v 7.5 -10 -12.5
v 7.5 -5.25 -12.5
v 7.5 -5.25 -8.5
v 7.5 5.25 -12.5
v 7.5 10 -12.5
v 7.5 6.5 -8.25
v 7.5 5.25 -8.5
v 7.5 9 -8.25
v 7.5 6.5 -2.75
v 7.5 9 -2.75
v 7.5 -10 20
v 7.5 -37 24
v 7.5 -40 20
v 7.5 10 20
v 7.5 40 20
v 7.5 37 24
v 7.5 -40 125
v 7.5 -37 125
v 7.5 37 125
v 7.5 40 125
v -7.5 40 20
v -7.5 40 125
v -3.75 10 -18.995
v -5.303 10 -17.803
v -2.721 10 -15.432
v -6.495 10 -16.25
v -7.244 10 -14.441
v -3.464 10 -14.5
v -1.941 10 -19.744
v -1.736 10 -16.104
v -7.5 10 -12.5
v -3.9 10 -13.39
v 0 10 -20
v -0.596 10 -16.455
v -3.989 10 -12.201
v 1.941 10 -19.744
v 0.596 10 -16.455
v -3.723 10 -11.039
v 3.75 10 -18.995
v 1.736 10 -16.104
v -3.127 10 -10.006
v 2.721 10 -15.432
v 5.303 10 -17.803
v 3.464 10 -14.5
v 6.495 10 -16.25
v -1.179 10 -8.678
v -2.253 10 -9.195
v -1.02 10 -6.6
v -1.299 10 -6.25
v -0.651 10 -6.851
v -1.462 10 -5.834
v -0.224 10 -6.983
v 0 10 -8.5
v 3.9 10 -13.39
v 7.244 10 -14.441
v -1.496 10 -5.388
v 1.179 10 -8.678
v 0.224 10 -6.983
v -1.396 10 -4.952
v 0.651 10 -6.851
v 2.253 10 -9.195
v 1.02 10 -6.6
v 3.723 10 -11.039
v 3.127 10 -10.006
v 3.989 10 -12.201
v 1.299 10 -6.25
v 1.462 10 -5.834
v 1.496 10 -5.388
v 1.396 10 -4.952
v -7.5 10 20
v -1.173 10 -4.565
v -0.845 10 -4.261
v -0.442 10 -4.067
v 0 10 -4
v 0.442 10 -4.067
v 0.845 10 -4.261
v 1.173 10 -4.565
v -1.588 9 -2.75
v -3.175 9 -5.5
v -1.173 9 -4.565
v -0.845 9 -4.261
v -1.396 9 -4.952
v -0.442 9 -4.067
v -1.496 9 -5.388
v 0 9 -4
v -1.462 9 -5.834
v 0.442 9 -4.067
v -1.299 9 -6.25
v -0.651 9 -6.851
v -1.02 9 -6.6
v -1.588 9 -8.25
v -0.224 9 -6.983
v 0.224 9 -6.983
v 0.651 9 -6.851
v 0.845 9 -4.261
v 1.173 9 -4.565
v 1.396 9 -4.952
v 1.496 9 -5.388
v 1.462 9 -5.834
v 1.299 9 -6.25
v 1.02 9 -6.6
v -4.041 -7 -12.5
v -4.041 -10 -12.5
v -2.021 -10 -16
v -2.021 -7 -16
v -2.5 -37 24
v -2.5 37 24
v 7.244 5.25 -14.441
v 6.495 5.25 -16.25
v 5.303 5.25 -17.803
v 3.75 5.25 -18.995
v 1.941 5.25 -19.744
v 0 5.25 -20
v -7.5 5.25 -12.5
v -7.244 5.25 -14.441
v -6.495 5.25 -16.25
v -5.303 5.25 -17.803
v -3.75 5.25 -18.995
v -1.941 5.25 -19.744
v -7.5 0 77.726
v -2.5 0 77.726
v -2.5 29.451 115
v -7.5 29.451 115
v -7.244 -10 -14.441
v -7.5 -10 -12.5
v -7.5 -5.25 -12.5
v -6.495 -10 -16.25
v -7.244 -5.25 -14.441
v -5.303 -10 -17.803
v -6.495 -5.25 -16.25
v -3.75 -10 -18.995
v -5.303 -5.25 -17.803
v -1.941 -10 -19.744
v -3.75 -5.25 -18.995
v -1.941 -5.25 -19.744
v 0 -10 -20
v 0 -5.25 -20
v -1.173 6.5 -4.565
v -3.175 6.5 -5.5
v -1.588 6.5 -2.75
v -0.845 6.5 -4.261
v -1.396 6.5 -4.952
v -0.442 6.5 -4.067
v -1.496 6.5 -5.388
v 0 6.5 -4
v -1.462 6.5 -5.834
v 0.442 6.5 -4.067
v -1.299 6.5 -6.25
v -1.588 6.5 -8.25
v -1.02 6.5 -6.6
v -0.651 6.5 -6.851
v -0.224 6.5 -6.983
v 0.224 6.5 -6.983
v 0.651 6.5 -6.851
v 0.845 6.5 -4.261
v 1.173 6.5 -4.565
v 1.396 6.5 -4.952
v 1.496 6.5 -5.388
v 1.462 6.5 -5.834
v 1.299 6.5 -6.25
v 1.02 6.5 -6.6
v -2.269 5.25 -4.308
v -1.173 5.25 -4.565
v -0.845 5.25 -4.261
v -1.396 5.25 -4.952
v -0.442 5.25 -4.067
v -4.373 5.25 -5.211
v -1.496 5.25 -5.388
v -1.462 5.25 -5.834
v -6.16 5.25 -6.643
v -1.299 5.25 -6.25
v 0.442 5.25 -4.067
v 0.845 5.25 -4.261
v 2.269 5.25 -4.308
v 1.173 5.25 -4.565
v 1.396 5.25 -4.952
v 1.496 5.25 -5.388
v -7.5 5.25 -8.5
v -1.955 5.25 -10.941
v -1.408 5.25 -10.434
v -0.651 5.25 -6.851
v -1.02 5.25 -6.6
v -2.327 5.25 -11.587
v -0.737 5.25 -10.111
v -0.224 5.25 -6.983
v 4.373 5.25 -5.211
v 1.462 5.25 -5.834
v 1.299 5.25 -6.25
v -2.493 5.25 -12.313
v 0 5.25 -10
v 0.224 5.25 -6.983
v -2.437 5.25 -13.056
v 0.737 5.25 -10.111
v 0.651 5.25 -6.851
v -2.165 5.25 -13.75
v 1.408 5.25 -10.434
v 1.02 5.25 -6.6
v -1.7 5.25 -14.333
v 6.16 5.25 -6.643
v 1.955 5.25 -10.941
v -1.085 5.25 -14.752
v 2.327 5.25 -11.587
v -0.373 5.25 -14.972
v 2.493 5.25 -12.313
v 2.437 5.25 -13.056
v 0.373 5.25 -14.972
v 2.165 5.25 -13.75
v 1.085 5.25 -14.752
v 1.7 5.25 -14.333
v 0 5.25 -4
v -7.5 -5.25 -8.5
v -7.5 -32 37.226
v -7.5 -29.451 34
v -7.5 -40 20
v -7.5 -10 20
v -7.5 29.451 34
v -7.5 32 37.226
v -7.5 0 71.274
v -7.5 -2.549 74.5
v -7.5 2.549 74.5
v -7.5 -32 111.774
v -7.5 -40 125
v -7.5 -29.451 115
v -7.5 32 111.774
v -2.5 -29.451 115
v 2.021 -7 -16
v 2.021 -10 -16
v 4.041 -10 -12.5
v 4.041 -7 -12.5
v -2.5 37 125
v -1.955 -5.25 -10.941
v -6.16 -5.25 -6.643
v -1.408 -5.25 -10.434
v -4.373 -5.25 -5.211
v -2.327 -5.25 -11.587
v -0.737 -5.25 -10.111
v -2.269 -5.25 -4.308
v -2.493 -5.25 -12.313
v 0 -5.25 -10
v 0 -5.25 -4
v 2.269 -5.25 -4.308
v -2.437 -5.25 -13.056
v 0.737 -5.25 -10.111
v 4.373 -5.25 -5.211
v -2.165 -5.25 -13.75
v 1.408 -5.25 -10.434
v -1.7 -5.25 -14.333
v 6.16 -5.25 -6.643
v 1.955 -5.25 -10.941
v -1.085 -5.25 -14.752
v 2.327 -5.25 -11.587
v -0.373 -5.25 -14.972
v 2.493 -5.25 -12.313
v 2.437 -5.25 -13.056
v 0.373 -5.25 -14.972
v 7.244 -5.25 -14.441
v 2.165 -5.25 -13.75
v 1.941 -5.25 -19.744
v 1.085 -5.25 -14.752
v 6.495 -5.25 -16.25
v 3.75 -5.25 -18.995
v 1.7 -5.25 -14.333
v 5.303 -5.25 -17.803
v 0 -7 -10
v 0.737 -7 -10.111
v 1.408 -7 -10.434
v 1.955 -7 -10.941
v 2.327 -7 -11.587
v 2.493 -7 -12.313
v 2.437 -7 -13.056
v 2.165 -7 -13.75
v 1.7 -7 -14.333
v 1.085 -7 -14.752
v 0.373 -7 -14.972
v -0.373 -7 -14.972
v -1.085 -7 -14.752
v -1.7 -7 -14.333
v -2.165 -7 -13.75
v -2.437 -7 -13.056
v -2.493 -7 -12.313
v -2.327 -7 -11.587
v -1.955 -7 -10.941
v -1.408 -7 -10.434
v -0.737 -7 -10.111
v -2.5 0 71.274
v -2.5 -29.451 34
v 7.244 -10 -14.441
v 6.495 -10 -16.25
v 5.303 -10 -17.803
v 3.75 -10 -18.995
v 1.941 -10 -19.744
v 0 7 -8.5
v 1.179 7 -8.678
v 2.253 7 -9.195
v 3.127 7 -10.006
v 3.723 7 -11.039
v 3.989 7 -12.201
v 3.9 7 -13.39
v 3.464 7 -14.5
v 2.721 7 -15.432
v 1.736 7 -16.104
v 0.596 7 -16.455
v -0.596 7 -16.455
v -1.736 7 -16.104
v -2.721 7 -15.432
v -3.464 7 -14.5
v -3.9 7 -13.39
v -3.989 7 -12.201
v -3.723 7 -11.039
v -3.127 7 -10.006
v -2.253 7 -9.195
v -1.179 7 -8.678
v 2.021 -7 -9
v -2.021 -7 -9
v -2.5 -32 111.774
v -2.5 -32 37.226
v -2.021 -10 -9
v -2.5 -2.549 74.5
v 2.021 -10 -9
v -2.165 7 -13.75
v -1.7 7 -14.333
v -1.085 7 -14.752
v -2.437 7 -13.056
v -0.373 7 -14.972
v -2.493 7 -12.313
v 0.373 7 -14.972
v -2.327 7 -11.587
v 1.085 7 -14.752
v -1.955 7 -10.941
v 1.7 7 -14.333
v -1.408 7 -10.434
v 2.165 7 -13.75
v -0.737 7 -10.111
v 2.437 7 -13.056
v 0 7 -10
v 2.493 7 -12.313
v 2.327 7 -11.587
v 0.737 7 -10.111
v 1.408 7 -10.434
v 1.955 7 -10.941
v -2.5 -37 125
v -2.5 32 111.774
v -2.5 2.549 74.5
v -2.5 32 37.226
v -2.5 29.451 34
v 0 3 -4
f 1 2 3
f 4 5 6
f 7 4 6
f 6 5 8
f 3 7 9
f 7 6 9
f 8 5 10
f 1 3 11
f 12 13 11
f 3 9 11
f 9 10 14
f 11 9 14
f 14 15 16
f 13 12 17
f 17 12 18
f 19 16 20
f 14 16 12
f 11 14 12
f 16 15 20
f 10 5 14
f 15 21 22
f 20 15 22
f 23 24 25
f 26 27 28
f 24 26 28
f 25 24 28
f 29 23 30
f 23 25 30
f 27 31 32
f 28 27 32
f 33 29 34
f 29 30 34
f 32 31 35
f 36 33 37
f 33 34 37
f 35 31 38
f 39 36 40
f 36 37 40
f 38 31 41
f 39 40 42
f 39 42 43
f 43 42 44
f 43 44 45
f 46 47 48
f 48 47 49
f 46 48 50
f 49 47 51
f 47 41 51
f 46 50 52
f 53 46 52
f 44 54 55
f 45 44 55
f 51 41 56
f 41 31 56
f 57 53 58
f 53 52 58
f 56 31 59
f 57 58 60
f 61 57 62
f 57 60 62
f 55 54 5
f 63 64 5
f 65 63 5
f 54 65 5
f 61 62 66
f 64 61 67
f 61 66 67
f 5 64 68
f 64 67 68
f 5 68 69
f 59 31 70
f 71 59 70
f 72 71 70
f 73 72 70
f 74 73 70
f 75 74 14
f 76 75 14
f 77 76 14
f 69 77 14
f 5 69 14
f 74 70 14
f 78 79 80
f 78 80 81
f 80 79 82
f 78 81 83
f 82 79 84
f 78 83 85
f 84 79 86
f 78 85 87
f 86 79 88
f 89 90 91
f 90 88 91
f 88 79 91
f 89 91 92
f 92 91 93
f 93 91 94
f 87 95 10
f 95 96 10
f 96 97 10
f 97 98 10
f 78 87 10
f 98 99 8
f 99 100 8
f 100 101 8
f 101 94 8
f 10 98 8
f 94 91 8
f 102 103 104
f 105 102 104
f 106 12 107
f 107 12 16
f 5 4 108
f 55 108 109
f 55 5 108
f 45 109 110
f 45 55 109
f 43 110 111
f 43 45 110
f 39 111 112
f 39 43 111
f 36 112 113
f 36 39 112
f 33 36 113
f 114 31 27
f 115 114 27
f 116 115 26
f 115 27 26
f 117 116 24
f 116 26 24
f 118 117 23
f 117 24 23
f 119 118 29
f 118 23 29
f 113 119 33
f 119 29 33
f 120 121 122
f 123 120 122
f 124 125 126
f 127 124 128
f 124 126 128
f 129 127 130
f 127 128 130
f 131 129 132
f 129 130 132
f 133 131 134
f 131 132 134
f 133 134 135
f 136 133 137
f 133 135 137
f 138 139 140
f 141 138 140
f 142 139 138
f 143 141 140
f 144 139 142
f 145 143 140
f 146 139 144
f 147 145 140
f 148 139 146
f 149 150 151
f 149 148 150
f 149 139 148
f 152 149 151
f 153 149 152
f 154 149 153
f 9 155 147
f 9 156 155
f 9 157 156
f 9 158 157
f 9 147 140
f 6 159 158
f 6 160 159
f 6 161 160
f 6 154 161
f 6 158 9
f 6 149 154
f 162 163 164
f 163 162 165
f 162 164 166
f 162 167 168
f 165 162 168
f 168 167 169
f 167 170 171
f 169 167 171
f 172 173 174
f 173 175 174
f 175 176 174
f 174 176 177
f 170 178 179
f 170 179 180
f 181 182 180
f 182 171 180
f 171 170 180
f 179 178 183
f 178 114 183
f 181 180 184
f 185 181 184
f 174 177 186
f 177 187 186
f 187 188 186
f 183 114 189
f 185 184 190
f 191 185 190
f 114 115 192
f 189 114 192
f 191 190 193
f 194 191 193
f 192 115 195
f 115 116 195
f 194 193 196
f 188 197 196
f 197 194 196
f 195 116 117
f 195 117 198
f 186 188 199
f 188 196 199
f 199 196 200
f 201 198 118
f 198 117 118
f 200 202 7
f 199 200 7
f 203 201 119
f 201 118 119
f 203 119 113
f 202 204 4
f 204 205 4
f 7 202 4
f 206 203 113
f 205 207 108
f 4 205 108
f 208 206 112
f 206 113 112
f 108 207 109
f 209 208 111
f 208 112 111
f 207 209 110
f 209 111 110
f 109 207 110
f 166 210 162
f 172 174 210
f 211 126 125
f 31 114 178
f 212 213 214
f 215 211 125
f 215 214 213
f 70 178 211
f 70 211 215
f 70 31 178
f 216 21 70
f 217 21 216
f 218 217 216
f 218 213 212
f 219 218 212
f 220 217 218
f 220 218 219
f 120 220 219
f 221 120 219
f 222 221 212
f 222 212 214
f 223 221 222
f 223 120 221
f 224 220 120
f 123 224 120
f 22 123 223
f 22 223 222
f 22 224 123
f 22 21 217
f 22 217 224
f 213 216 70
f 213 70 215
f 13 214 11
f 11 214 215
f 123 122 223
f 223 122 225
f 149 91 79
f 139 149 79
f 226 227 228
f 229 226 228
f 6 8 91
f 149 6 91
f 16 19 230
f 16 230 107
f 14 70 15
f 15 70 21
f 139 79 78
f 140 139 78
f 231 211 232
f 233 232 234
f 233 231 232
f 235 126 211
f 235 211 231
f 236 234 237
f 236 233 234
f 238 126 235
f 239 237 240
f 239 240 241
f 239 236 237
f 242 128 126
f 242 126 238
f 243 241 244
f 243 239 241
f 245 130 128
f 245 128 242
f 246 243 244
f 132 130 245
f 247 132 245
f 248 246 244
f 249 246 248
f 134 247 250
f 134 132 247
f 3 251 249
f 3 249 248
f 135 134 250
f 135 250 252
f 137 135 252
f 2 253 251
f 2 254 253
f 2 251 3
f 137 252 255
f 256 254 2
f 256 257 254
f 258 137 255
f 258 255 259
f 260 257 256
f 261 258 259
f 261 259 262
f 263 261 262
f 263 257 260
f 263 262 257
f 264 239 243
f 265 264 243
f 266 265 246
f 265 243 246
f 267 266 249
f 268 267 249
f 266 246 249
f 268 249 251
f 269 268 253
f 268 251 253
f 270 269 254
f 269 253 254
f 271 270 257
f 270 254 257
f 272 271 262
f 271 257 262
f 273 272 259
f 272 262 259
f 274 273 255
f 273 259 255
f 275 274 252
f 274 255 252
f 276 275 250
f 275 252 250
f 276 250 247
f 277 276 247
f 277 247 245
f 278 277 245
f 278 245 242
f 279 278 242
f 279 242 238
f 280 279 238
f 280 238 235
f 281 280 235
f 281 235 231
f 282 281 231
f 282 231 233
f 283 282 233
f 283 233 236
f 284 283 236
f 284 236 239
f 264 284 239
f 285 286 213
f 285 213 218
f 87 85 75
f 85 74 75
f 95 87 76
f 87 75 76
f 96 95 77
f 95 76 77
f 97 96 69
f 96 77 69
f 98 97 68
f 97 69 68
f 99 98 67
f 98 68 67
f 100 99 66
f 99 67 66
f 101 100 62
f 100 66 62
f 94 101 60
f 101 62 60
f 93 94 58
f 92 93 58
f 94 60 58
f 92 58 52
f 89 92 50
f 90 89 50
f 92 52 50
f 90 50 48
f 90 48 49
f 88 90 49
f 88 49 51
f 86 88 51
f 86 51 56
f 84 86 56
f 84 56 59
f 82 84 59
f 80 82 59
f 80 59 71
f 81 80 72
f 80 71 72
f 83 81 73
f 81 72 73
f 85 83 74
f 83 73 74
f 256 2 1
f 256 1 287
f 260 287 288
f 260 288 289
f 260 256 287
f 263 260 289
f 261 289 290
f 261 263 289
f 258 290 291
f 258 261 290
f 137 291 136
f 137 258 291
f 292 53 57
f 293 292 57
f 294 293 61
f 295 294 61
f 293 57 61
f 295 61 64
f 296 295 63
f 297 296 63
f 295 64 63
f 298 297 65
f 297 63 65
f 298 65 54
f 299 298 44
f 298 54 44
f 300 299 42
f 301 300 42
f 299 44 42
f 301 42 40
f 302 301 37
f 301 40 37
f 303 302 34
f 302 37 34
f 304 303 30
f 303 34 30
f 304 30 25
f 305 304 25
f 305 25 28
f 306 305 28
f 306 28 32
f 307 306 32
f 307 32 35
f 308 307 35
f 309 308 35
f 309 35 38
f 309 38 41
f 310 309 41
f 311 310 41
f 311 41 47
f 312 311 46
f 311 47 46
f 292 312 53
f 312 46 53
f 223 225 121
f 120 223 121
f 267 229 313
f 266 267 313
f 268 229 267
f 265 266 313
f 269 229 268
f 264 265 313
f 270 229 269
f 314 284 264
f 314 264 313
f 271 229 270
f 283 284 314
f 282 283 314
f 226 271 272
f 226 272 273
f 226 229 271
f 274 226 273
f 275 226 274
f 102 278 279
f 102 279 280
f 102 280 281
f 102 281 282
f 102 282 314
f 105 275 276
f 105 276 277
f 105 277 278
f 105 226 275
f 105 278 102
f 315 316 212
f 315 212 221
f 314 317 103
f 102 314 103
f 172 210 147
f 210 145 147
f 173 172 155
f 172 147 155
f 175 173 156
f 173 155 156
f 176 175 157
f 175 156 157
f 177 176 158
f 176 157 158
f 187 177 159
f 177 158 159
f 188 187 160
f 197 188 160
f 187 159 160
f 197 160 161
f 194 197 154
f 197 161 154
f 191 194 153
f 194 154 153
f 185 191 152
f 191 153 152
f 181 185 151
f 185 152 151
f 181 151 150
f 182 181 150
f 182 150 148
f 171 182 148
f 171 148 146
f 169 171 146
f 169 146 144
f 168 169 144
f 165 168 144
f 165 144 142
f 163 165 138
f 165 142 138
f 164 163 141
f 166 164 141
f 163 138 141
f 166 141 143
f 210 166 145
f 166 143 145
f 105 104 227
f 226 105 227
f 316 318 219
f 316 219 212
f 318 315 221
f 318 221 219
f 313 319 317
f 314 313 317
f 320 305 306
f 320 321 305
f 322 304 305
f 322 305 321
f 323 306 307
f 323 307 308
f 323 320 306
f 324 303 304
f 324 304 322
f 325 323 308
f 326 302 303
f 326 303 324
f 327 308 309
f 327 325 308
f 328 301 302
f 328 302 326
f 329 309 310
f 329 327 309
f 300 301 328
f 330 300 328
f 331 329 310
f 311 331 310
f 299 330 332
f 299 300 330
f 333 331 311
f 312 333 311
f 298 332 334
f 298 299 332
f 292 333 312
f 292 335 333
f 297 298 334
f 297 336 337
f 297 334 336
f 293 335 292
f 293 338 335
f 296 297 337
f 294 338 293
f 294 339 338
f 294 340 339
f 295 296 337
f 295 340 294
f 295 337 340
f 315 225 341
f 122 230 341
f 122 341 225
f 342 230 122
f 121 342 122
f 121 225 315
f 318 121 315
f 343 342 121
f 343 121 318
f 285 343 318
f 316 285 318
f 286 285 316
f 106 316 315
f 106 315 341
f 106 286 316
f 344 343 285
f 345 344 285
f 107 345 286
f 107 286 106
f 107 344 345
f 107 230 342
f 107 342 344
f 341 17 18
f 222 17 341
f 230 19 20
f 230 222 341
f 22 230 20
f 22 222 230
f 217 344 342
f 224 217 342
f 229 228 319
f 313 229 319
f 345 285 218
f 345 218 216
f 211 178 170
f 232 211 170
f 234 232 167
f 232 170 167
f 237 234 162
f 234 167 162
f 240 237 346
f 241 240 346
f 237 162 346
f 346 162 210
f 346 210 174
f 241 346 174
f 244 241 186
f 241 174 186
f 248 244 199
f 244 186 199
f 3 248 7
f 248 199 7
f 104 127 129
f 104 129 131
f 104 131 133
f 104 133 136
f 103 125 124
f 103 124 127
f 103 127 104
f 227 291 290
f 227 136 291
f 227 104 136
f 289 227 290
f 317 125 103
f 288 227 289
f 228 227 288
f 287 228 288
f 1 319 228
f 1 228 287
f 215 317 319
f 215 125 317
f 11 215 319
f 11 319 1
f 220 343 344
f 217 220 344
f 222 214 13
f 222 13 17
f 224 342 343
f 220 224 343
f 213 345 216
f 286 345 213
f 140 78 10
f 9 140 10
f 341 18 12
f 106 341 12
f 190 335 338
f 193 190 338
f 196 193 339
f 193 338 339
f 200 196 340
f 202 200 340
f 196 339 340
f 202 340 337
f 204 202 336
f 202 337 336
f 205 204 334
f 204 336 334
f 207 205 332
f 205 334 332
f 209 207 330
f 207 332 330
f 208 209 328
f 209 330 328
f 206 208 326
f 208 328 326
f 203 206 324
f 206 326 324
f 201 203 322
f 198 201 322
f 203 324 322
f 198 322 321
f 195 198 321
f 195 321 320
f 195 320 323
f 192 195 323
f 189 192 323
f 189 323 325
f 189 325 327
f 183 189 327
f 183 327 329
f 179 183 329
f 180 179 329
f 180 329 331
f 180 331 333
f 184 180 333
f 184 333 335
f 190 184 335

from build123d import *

# Parameters (mm, degrees)
SKETCH1_W           = 15
SKETCH1_H           = 20
BOSS_EXTRUDE1_DEPTH = 20
FILLET1_R           = 7.5
CUT_EXTRUDE1_START  = -4.75
SKETCH3_R           = 8.5
CUT_EXTRUDE1_DEPTH  = 10.5
SKETCH4_R           = 2.5
CUT_EXTRUDE2_DEPTH  = 30.261749777
CUT_EXTRUDE3_DEPTH  = 3
SKETCH6_R           = 4
CUT_EXTRUDE4_DEPTH  = 3
SKETCH7_W           = 105
SKETCH7_H           = 80
BOSS_EXTRUDE2_DEPTH = 15
SKETCH9_W           = 101
SKETCH9_H           = 74
CUT_EXTRUDE5_DEPTH  = 10
CUT_EXTRUDE6_DEPTH  = 132.624465811
CUT_EXTRUDE7_START  = -1
CUT_EXTRUDE7_DEPTH  = 2.5
SKETCH13_R          = 1.5
CUT_EXTRUDE8_DEPTH  = 7


with BuildPart() as part:
    # Sketch1 → Boss-Extrude1 (new, symmetric)
    with BuildSketch(Plane.XY):
        Rectangle(SKETCH1_W, SKETCH1_H)
    extrude(amount=BOSS_EXTRUDE1_DEPTH, both=True)

    # Fillet1
    fillet1_edges = [part.edges().sort_by_distance(p)[0] for p in [
        (-7.5, 0, -20),
        (7.5, 0, -20),
    ]]
    fillet(fillet1_edges, radius=FILLET1_R - 0.0001)  # a hair under: the kernel refuses the full size

    # Sketch3 → Cut-Extrude1 (cut)
    with BuildSketch(Plane(origin=(0, 10, 0), x_dir=(1, 0, 0), z_dir=(0, 1, 0)).offset(CUT_EXTRUDE1_START)):
        with Locations((0, 12.5)):
            Circle(SKETCH3_R)
    extrude(amount=-CUT_EXTRUDE1_DEPTH, mode=Mode.SUBTRACT)

    # Sketch4 → Cut-Extrude2 (cut, through all)
    with BuildSketch(Plane(origin=(0, 10, 0), x_dir=(1, 0, 0), z_dir=(0, 1, 0))):
        with Locations(Location((0, 12.5, 0), (0, 0, 270))):
            Circle(SKETCH4_R)
    extrude(amount=-CUT_EXTRUDE2_DEPTH, mode=Mode.SUBTRACT)

    # Sketch5 → Cut-Extrude3 (cut)
    with BuildSketch(Plane(origin=(0, -10, 0), x_dir=(-1, 0, 0), z_dir=(0, -1, 0))):
        Polygon((-2.020725942, 16), (-4.041451884, 12.5), (-2.020725942, 9), (2.020725942, 9), (4.041451884, 12.5), (2.020725942, 16), align=None)
    extrude(amount=-CUT_EXTRUDE3_DEPTH, mode=Mode.SUBTRACT)

    # Sketch6 → Cut-Extrude4 (cut)
    with BuildSketch(Plane(origin=(0, 10, 0), x_dir=(1, 0, 0), z_dir=(0, 1, 0))):
        with Locations(Location((0, 12.5, 0), (0, 0, 270))):
            Circle(SKETCH6_R)
    extrude(amount=-CUT_EXTRUDE4_DEPTH, mode=Mode.SUBTRACT)

    # Sketch7 → Boss-Extrude2 (add)
    with BuildSketch(Plane.ZY.offset(7.5)):
        with Locations((72.5, 0)):
            Rectangle(SKETCH7_W, SKETCH7_H)
    extrude(amount=-BOSS_EXTRUDE2_DEPTH)

    # Sketch9 → Cut-Extrude5 (cut)
    with BuildSketch(Plane(origin=(7.5, 0, 0), x_dir=(0, 0, -1), z_dir=(1, 0, 0))):
        with Locations((-74.5, 0)):
            Rectangle(SKETCH9_W, SKETCH9_H)
    extrude(amount=-CUT_EXTRUDE5_DEPTH, mode=Mode.SUBTRACT)

    # Sketch10 → Cut-Extrude6 (cut, through all)
    with BuildSketch(Plane(origin=(-2.5, 0, 0), x_dir=(0, 0, -1), z_dir=(1, 0, 0))):
        Polygon((-111.773976664, -32), (-74.5, -2.54895671), (-37.226023336, -32), align=None)
        Polygon((-115, -29.45104329), (-77.726023336, 0), (-115, 29.45104329), align=None)
        Polygon((-37.226023336, 32), (-111.773976664, 32), (-74.5, 2.54895671), align=None)
        Polygon((-71.273976664, 0), (-34, 29.45104329), (-34, -29.45104329), align=None)
    extrude(amount=-CUT_EXTRUDE6_DEPTH, mode=Mode.SUBTRACT)

    # Sketch12 → Cut-Extrude7 (cut)
    with BuildSketch(Plane(origin=(0, 10, 0), x_dir=(1, 0, 0), z_dir=(0, 1, 0)).offset(CUT_EXTRUDE7_START)):
        Polygon((-1.58771324, 8.25), (-3.175426481, 5.5), (-1.58771324, 2.75), (1.58771324, 2.75), (7.5, 2.75), (7.5, 8.25), (1.58771324, 8.25), align=None)
    extrude(amount=-CUT_EXTRUDE7_DEPTH, mode=Mode.SUBTRACT)

    # Sketch13 → Cut-Extrude8 (cut)
    with BuildSketch(Plane(origin=(0, 10, 0), x_dir=(1, 0, 0), z_dir=(0, 1, 0))):
        with Locations(Location((0, 5.5, 0), (0, 0, 270))):
            Circle(SKETCH13_R)
    extrude(amount=-CUT_EXTRUDE8_DEPTH, mode=Mode.SUBTRACT)


solid = part.part
